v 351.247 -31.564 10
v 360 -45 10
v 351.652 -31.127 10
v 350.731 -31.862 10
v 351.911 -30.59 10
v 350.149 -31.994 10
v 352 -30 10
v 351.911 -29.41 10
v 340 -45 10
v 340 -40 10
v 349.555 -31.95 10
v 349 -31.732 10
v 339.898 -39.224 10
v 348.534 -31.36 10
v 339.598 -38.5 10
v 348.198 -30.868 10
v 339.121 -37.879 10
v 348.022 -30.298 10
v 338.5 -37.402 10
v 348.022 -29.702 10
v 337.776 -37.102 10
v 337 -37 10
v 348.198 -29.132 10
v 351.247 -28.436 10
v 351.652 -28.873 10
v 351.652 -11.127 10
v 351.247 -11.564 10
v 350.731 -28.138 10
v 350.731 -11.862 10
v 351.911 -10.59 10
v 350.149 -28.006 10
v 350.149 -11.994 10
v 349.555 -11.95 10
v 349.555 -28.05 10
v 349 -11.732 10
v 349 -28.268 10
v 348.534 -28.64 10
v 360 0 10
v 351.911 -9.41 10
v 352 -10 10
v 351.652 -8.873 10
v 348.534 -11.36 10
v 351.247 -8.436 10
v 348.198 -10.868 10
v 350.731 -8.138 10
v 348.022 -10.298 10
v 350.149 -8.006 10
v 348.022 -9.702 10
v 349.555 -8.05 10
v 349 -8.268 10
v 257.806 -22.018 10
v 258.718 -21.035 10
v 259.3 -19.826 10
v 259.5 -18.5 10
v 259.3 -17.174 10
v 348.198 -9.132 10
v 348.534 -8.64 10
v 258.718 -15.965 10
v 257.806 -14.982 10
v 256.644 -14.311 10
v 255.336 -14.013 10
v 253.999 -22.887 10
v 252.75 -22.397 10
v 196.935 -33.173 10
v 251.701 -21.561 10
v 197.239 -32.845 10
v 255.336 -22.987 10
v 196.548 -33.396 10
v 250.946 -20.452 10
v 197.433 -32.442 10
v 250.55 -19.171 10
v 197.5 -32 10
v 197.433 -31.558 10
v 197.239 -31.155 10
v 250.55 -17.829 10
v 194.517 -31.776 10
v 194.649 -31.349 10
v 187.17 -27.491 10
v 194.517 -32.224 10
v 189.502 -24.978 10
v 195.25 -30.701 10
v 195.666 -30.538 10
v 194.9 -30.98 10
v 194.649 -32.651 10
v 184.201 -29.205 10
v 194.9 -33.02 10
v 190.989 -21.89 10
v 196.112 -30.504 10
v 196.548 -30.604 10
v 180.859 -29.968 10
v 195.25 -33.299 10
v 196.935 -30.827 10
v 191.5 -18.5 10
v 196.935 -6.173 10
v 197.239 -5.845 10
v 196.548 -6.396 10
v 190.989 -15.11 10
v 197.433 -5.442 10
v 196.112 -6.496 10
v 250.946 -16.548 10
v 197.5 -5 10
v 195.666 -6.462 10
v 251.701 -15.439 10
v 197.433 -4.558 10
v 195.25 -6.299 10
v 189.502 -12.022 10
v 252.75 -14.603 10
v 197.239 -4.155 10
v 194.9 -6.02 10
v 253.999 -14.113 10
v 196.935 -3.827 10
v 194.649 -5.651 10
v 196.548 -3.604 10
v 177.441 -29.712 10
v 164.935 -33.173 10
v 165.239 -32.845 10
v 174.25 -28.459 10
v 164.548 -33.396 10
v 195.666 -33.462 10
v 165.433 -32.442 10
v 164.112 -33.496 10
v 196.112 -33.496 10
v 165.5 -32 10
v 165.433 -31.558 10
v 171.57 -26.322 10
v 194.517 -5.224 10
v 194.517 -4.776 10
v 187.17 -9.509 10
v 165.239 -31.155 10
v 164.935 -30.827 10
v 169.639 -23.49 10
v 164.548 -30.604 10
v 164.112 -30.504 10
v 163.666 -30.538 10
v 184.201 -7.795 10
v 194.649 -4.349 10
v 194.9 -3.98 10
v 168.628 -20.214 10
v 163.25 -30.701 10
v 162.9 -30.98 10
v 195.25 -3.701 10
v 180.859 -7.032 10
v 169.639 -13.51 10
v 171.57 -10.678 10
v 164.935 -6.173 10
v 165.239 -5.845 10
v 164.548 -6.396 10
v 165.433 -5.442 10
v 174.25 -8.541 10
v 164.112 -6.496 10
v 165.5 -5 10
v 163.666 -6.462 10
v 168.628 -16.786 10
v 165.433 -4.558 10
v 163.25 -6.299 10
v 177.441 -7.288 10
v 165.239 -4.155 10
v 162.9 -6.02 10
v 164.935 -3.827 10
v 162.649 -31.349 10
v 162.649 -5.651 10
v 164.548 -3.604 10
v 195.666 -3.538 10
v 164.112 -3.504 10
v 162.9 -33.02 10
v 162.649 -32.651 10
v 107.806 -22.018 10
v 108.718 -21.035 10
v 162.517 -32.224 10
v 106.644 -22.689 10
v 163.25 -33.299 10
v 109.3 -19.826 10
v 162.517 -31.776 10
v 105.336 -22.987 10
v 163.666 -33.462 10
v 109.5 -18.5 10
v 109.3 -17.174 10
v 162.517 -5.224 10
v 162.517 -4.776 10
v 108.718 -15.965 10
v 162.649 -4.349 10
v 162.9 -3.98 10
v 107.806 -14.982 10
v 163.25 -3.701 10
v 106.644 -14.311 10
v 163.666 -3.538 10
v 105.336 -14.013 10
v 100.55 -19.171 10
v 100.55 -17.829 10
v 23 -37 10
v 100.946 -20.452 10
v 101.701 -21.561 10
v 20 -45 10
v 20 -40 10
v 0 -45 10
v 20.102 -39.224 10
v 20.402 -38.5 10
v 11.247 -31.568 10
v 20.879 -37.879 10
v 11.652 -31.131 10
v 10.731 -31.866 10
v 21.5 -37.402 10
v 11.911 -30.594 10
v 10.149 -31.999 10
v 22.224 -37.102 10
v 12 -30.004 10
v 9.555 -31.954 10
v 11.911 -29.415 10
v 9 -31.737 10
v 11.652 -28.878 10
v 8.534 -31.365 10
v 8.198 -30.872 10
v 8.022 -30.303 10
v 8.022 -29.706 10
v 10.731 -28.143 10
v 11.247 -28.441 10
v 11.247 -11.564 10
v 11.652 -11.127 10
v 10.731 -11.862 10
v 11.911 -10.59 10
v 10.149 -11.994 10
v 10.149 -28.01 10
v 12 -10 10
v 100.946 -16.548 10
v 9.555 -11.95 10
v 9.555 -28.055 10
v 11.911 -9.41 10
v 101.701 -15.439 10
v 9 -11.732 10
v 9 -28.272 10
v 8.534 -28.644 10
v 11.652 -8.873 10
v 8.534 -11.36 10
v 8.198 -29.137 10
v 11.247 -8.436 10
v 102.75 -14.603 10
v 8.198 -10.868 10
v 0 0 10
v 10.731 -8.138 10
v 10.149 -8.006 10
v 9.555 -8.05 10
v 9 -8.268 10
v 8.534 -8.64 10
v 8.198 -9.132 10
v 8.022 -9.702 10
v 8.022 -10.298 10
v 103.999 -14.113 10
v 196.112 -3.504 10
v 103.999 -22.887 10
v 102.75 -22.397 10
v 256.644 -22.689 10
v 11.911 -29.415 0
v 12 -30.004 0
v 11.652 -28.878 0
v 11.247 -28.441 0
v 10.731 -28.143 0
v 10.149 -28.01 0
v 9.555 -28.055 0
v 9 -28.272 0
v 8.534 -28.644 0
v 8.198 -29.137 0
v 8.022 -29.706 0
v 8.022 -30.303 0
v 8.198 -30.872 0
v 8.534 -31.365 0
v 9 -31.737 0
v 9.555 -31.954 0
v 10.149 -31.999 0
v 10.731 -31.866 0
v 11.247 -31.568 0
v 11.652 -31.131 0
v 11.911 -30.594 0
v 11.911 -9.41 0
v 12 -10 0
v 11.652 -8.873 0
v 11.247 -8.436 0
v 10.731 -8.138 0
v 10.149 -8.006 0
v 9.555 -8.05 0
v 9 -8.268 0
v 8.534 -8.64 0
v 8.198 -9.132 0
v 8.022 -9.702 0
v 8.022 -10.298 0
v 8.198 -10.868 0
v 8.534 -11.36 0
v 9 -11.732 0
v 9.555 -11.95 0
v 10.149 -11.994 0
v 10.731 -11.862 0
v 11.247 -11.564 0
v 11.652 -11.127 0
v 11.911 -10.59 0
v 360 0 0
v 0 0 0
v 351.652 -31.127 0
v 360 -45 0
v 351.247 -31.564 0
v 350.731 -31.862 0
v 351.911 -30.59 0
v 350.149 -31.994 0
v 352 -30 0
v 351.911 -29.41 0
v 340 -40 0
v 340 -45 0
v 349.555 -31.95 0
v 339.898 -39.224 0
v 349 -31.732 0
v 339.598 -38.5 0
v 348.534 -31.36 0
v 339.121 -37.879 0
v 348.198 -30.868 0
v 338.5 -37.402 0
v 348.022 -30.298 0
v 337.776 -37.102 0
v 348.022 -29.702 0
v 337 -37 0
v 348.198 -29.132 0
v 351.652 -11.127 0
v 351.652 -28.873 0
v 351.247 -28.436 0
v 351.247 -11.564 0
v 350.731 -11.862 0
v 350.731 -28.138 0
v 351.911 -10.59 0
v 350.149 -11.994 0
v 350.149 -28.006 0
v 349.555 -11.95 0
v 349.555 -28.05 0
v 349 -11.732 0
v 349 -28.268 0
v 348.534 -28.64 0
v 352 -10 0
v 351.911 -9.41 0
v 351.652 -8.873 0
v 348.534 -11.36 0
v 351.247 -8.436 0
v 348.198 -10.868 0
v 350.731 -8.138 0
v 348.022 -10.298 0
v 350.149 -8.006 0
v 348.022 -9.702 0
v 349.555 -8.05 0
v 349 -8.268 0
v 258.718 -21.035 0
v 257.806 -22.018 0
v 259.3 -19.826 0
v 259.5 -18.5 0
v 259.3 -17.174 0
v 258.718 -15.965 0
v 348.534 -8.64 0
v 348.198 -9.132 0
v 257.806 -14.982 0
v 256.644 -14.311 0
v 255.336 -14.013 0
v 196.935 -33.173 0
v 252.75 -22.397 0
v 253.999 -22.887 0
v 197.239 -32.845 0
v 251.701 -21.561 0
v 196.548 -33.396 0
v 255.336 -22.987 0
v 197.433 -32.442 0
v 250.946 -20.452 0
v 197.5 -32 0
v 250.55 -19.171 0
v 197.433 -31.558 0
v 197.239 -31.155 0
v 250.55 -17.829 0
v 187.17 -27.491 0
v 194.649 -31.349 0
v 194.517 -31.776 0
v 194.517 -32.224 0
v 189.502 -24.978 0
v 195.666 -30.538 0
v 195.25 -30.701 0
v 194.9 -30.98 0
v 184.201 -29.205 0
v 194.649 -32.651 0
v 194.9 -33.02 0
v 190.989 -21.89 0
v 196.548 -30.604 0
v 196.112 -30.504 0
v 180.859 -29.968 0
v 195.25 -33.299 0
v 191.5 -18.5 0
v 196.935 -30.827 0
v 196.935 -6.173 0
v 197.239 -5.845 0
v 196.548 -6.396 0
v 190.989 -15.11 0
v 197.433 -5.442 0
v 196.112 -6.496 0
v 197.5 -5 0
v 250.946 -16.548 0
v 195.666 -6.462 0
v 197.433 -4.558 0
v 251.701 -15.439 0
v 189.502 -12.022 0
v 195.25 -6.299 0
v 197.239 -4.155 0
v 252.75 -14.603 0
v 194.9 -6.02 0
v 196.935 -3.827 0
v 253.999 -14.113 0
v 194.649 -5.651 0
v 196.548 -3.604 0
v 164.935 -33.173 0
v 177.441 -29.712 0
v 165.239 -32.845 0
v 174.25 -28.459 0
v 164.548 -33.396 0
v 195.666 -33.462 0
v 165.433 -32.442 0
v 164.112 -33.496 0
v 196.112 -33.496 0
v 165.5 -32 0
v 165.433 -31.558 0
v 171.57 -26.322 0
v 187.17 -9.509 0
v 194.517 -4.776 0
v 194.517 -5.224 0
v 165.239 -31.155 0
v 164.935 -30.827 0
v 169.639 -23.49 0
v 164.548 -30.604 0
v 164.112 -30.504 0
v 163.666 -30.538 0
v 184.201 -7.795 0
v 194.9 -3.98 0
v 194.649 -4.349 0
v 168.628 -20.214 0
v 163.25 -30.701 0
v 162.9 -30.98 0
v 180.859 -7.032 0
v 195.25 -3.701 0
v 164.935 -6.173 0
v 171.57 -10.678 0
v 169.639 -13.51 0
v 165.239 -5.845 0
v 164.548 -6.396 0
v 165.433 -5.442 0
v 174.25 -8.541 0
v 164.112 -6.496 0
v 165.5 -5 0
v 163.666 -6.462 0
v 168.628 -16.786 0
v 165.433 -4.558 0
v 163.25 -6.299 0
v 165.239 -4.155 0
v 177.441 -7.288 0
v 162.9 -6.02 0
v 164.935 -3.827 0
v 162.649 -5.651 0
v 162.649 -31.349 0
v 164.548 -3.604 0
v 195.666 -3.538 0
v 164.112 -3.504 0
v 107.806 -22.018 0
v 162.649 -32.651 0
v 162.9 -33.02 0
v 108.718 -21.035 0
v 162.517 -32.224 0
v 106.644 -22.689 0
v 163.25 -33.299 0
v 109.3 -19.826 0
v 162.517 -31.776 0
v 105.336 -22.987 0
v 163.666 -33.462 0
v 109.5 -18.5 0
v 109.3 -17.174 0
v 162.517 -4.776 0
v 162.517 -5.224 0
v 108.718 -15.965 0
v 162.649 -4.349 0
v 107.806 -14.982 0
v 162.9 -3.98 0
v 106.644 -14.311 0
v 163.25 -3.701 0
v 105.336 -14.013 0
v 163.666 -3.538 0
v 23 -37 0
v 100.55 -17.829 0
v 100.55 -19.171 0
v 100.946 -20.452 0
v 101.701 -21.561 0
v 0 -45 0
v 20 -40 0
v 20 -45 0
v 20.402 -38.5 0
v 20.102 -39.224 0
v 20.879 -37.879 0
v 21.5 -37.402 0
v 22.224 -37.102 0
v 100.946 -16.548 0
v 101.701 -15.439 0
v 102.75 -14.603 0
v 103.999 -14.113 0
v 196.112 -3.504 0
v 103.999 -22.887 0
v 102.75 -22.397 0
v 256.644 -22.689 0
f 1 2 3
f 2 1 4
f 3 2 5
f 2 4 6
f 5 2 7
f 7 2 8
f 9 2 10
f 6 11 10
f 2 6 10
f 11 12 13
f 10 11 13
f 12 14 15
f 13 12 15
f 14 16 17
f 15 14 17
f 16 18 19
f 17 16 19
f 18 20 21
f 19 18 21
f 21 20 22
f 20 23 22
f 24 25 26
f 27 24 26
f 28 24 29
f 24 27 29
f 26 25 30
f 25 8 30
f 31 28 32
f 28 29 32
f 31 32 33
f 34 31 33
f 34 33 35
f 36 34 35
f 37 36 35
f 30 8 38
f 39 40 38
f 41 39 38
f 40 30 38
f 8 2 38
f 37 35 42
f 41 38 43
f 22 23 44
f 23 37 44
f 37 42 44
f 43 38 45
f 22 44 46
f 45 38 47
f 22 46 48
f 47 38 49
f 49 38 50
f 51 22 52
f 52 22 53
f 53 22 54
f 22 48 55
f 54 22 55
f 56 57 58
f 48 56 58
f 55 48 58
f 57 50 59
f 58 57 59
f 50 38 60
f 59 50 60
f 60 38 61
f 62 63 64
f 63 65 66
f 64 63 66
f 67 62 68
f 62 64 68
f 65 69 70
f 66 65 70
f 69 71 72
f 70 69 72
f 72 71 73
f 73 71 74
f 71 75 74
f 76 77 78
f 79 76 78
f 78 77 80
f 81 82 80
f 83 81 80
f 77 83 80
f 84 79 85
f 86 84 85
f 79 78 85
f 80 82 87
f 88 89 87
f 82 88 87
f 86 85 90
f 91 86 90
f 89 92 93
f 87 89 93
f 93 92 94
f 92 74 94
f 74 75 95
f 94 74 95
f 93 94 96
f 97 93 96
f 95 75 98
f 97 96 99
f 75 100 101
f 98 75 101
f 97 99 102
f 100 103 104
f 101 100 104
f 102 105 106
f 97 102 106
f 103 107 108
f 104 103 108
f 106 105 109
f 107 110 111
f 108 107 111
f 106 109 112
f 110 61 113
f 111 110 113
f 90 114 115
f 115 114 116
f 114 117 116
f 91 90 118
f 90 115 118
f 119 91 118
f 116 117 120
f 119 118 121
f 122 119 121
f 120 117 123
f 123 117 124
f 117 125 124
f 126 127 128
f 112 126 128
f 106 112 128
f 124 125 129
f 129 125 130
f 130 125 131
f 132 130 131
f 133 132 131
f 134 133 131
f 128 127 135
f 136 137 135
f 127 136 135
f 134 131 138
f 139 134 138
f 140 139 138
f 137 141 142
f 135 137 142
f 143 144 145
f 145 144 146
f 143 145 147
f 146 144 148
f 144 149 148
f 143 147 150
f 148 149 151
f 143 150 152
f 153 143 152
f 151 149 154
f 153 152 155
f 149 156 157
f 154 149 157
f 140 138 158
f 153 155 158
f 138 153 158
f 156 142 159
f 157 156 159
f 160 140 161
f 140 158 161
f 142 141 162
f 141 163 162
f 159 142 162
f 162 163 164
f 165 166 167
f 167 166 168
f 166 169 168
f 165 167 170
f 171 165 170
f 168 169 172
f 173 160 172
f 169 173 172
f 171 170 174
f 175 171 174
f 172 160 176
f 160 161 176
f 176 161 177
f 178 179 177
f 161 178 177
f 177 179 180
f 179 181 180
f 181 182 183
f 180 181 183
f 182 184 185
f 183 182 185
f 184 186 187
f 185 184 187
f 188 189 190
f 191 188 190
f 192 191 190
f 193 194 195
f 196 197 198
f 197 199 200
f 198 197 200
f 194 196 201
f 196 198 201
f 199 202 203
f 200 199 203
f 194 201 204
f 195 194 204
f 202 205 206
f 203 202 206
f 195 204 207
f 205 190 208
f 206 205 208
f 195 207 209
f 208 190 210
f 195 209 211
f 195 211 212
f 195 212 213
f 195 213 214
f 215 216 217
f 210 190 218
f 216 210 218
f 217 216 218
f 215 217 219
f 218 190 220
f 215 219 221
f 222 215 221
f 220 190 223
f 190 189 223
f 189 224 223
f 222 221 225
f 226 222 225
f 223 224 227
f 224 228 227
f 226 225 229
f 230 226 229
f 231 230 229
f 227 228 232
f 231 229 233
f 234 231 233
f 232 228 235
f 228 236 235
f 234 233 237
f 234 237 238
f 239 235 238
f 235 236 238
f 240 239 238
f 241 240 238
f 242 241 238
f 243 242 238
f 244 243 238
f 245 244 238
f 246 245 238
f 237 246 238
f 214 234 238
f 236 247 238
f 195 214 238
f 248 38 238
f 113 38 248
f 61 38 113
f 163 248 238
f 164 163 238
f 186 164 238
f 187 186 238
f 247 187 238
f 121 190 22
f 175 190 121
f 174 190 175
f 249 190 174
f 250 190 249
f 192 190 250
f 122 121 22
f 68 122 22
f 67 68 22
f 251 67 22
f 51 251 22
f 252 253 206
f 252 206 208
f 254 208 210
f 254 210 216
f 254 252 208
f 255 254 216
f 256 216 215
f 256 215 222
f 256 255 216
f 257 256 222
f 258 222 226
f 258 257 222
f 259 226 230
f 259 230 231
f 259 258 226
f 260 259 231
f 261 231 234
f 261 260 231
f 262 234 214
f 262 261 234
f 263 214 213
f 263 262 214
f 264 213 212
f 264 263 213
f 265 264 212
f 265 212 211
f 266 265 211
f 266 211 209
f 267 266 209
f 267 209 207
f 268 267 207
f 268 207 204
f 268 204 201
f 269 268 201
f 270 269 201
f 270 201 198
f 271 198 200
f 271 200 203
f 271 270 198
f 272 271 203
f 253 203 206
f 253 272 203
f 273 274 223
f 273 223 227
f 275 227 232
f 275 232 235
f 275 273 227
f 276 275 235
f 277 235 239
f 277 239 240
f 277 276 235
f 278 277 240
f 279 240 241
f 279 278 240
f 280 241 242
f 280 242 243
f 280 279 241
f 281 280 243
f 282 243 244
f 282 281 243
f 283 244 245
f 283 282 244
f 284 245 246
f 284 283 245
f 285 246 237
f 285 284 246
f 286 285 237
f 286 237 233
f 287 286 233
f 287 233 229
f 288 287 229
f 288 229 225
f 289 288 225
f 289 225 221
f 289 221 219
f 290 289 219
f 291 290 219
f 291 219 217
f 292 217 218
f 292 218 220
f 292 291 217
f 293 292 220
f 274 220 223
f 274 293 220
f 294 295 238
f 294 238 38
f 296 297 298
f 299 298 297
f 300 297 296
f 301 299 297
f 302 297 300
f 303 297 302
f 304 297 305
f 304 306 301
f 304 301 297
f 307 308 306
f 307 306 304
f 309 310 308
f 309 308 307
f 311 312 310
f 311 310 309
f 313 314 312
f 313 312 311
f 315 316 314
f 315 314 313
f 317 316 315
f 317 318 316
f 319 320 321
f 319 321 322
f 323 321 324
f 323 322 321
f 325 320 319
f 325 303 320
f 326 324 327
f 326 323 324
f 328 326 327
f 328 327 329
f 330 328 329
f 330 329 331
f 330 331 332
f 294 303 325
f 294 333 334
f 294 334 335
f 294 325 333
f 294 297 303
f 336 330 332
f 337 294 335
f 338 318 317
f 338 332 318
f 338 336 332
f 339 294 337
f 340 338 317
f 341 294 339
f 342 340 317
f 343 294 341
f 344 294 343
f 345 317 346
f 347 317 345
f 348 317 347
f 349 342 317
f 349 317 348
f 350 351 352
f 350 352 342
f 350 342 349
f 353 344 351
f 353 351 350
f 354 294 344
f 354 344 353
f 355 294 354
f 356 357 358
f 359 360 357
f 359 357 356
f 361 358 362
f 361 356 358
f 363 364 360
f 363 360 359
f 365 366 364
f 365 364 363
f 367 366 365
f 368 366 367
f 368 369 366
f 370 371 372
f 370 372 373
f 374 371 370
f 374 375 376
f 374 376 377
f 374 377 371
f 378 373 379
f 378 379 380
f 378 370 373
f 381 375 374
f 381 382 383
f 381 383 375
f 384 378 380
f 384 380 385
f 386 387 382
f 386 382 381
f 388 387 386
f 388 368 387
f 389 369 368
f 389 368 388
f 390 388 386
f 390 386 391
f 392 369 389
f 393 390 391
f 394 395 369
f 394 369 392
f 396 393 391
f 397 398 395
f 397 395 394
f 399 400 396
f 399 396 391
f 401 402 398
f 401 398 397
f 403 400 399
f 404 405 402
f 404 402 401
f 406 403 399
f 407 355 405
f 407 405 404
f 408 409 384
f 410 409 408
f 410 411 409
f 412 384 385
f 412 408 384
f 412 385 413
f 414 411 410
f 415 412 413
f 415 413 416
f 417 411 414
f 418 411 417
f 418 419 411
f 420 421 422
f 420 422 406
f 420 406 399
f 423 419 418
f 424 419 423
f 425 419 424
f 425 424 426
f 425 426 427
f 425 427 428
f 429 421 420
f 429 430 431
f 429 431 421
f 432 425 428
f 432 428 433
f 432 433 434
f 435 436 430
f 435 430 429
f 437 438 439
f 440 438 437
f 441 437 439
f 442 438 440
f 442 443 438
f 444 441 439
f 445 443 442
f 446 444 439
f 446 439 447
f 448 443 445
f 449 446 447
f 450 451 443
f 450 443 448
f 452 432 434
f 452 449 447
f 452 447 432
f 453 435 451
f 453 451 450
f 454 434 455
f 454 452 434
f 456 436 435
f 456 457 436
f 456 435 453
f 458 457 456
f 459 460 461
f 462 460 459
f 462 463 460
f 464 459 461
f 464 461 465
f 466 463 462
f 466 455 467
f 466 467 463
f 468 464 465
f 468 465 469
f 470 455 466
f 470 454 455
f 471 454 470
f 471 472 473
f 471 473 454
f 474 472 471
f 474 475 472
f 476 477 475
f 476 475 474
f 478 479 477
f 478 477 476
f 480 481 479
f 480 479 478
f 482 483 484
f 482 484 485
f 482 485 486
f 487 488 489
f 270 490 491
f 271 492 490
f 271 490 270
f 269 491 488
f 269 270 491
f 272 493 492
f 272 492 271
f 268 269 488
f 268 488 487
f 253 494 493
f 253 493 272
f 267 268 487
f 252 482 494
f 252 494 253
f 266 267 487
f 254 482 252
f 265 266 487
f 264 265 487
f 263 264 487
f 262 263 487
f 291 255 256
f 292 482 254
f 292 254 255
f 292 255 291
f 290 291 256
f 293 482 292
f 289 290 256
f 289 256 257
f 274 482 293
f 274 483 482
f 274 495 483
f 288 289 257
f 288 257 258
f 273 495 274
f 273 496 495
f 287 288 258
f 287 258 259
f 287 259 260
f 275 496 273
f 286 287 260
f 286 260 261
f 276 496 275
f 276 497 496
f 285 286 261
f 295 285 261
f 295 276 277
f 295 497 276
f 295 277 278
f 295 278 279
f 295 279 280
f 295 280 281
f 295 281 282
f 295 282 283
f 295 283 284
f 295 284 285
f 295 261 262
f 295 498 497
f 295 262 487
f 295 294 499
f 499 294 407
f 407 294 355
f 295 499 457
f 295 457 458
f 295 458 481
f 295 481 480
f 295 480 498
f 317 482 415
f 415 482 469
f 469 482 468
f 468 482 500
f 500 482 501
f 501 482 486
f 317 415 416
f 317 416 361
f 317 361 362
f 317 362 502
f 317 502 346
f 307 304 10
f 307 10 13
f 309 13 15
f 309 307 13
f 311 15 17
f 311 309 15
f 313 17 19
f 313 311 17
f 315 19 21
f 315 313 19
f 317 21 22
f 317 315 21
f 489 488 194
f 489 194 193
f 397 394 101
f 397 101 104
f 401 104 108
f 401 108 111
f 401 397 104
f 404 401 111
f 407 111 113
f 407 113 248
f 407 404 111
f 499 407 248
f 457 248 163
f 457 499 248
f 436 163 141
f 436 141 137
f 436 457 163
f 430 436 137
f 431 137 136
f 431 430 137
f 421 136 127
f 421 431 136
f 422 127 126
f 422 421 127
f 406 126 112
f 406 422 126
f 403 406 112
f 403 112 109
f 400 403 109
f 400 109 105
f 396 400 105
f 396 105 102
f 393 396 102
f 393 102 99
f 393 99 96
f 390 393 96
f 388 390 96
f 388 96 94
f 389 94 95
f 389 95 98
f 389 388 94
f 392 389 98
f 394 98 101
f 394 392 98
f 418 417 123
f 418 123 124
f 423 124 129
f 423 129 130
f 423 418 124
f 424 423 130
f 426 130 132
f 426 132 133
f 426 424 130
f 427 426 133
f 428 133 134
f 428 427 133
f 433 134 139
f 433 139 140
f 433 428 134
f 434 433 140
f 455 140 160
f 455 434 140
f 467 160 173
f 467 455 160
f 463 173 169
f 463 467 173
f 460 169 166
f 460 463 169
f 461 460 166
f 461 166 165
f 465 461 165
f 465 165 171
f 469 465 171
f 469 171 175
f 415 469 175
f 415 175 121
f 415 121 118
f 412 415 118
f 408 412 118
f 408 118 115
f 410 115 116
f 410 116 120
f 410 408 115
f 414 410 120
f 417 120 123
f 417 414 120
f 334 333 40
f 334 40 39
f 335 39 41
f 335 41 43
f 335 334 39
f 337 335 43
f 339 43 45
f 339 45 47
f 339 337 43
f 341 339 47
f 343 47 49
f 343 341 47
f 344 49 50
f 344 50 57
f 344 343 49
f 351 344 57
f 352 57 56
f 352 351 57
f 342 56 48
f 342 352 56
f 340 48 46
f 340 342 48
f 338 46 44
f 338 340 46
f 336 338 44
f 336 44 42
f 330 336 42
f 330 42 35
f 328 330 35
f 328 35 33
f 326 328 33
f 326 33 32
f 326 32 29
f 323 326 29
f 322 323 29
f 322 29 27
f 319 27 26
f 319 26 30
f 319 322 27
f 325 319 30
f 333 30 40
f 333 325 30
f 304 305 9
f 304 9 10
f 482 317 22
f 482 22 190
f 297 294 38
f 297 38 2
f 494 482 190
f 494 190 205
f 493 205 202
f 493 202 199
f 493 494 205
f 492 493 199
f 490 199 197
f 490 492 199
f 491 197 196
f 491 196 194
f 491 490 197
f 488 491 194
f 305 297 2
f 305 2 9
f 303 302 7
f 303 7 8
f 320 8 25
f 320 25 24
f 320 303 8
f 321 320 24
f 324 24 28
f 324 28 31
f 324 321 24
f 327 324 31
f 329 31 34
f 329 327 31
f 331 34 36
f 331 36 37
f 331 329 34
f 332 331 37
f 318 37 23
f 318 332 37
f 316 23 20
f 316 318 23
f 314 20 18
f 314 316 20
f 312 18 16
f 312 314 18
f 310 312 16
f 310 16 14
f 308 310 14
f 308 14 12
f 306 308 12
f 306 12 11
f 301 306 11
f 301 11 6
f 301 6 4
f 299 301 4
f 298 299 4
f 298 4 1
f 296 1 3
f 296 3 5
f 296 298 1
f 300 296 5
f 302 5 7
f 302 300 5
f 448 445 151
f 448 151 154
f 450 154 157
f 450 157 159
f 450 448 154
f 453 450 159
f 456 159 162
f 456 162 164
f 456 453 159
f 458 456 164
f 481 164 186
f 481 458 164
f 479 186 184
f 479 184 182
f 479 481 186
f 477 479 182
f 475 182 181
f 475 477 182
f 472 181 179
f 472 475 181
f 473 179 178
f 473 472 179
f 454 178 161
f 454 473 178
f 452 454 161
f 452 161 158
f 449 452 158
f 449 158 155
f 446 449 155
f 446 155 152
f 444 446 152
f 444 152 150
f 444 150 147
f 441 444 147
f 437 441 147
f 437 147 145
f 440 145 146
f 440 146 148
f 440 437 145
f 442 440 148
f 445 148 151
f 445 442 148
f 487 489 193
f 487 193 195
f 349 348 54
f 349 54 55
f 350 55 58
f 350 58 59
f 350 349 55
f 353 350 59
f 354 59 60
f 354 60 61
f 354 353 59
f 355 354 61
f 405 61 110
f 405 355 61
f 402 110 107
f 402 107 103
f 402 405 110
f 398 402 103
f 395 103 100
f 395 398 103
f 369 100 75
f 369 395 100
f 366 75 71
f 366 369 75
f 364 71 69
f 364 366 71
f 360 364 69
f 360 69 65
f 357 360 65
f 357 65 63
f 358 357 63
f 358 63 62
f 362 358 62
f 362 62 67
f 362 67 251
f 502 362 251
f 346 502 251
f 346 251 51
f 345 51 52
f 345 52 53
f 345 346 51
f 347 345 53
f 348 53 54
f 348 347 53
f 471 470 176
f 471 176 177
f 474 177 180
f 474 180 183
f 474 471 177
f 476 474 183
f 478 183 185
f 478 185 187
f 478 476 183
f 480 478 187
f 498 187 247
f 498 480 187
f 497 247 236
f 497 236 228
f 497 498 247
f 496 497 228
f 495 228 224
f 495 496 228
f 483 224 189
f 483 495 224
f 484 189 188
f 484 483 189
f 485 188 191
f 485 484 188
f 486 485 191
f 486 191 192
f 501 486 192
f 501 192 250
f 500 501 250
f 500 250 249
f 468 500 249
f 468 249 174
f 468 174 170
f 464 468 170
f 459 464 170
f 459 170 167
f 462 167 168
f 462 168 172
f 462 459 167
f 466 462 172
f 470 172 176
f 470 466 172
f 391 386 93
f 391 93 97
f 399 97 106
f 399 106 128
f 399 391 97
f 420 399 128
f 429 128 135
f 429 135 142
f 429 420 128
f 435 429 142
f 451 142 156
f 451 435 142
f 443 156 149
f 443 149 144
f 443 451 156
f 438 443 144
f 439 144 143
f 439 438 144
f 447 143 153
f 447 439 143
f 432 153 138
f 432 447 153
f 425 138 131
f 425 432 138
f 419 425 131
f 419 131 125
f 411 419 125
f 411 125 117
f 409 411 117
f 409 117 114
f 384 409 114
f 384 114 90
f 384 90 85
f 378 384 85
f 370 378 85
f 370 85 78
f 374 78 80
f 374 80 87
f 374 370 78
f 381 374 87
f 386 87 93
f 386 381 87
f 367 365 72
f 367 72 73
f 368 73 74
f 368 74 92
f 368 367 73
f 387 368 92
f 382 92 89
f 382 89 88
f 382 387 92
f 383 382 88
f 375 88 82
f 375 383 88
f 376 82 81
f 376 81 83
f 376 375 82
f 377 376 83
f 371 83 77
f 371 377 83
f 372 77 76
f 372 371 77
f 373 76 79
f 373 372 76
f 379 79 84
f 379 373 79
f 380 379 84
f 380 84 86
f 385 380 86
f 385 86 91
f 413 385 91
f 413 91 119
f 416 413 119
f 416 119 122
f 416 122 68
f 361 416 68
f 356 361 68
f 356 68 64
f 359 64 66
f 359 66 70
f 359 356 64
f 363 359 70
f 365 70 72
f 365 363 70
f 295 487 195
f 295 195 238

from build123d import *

# Parameters (mm, degrees)
SKETCH1_R           = 2
SKETCH1_R_2         = 11.5
SKETCH1_R_3         = 4.5
SKETCH1_R_4         = 1.5
BOSS_EXTRUDE1_DEPTH = 10


with BuildPart() as part:
    # Sketch1 → Boss-Extrude1 (new body)
    with BuildSketch(Plane.XY):
        with BuildLine():
            Line((0, 0), (360, 0))
            Line((360, 0), (360, -45))
            Line((360, -45), (340, -45))
            Line((340, -45), (340, -40))
            ThreePointArc((340, -40), (339.121320344, -37.878679656), (337, -37))
            Line((337, -37), (23, -37))
            ThreePointArc((23, -37), (20.878679656, -37.878679656), (20, -40))
            Line((20, -40), (20, -45))
            Line((20, -45), (0, -45))
            Line((0, -45), (0, 0))
        make_face()
        with Locations((350, -10)):
            Circle(SKETCH1_R, mode=Mode.SUBTRACT)
        with Locations((350, -30)):
            Circle(SKETCH1_R, mode=Mode.SUBTRACT)
        with Locations((10, -10)):
            Circle(SKETCH1_R, mode=Mode.SUBTRACT)
        with Locations((10, -30.004476127)):
            Circle(SKETCH1_R, mode=Mode.SUBTRACT)
        with Locations((180, -18.5)):
            Circle(SKETCH1_R_2, mode=Mode.SUBTRACT)
        with Locations((255, -18.5)):
            Circle(SKETCH1_R_3, mode=Mode.SUBTRACT)
        with Locations((105, -18.5)):
            Circle(SKETCH1_R_3, mode=Mode.SUBTRACT)
        with Locations((164, -5)):
            Circle(SKETCH1_R_4, mode=Mode.SUBTRACT)
        with Locations((196, -5)):
            Circle(SKETCH1_R_4, mode=Mode.SUBTRACT)
        with Locations((196, -32)):
            Circle(SKETCH1_R_4, mode=Mode.SUBTRACT)
        with Locations((164, -32)):
            Circle(SKETCH1_R_4, mode=Mode.SUBTRACT)
    extrude(amount=BOSS_EXTRUDE1_DEPTH)


solid = part.part
